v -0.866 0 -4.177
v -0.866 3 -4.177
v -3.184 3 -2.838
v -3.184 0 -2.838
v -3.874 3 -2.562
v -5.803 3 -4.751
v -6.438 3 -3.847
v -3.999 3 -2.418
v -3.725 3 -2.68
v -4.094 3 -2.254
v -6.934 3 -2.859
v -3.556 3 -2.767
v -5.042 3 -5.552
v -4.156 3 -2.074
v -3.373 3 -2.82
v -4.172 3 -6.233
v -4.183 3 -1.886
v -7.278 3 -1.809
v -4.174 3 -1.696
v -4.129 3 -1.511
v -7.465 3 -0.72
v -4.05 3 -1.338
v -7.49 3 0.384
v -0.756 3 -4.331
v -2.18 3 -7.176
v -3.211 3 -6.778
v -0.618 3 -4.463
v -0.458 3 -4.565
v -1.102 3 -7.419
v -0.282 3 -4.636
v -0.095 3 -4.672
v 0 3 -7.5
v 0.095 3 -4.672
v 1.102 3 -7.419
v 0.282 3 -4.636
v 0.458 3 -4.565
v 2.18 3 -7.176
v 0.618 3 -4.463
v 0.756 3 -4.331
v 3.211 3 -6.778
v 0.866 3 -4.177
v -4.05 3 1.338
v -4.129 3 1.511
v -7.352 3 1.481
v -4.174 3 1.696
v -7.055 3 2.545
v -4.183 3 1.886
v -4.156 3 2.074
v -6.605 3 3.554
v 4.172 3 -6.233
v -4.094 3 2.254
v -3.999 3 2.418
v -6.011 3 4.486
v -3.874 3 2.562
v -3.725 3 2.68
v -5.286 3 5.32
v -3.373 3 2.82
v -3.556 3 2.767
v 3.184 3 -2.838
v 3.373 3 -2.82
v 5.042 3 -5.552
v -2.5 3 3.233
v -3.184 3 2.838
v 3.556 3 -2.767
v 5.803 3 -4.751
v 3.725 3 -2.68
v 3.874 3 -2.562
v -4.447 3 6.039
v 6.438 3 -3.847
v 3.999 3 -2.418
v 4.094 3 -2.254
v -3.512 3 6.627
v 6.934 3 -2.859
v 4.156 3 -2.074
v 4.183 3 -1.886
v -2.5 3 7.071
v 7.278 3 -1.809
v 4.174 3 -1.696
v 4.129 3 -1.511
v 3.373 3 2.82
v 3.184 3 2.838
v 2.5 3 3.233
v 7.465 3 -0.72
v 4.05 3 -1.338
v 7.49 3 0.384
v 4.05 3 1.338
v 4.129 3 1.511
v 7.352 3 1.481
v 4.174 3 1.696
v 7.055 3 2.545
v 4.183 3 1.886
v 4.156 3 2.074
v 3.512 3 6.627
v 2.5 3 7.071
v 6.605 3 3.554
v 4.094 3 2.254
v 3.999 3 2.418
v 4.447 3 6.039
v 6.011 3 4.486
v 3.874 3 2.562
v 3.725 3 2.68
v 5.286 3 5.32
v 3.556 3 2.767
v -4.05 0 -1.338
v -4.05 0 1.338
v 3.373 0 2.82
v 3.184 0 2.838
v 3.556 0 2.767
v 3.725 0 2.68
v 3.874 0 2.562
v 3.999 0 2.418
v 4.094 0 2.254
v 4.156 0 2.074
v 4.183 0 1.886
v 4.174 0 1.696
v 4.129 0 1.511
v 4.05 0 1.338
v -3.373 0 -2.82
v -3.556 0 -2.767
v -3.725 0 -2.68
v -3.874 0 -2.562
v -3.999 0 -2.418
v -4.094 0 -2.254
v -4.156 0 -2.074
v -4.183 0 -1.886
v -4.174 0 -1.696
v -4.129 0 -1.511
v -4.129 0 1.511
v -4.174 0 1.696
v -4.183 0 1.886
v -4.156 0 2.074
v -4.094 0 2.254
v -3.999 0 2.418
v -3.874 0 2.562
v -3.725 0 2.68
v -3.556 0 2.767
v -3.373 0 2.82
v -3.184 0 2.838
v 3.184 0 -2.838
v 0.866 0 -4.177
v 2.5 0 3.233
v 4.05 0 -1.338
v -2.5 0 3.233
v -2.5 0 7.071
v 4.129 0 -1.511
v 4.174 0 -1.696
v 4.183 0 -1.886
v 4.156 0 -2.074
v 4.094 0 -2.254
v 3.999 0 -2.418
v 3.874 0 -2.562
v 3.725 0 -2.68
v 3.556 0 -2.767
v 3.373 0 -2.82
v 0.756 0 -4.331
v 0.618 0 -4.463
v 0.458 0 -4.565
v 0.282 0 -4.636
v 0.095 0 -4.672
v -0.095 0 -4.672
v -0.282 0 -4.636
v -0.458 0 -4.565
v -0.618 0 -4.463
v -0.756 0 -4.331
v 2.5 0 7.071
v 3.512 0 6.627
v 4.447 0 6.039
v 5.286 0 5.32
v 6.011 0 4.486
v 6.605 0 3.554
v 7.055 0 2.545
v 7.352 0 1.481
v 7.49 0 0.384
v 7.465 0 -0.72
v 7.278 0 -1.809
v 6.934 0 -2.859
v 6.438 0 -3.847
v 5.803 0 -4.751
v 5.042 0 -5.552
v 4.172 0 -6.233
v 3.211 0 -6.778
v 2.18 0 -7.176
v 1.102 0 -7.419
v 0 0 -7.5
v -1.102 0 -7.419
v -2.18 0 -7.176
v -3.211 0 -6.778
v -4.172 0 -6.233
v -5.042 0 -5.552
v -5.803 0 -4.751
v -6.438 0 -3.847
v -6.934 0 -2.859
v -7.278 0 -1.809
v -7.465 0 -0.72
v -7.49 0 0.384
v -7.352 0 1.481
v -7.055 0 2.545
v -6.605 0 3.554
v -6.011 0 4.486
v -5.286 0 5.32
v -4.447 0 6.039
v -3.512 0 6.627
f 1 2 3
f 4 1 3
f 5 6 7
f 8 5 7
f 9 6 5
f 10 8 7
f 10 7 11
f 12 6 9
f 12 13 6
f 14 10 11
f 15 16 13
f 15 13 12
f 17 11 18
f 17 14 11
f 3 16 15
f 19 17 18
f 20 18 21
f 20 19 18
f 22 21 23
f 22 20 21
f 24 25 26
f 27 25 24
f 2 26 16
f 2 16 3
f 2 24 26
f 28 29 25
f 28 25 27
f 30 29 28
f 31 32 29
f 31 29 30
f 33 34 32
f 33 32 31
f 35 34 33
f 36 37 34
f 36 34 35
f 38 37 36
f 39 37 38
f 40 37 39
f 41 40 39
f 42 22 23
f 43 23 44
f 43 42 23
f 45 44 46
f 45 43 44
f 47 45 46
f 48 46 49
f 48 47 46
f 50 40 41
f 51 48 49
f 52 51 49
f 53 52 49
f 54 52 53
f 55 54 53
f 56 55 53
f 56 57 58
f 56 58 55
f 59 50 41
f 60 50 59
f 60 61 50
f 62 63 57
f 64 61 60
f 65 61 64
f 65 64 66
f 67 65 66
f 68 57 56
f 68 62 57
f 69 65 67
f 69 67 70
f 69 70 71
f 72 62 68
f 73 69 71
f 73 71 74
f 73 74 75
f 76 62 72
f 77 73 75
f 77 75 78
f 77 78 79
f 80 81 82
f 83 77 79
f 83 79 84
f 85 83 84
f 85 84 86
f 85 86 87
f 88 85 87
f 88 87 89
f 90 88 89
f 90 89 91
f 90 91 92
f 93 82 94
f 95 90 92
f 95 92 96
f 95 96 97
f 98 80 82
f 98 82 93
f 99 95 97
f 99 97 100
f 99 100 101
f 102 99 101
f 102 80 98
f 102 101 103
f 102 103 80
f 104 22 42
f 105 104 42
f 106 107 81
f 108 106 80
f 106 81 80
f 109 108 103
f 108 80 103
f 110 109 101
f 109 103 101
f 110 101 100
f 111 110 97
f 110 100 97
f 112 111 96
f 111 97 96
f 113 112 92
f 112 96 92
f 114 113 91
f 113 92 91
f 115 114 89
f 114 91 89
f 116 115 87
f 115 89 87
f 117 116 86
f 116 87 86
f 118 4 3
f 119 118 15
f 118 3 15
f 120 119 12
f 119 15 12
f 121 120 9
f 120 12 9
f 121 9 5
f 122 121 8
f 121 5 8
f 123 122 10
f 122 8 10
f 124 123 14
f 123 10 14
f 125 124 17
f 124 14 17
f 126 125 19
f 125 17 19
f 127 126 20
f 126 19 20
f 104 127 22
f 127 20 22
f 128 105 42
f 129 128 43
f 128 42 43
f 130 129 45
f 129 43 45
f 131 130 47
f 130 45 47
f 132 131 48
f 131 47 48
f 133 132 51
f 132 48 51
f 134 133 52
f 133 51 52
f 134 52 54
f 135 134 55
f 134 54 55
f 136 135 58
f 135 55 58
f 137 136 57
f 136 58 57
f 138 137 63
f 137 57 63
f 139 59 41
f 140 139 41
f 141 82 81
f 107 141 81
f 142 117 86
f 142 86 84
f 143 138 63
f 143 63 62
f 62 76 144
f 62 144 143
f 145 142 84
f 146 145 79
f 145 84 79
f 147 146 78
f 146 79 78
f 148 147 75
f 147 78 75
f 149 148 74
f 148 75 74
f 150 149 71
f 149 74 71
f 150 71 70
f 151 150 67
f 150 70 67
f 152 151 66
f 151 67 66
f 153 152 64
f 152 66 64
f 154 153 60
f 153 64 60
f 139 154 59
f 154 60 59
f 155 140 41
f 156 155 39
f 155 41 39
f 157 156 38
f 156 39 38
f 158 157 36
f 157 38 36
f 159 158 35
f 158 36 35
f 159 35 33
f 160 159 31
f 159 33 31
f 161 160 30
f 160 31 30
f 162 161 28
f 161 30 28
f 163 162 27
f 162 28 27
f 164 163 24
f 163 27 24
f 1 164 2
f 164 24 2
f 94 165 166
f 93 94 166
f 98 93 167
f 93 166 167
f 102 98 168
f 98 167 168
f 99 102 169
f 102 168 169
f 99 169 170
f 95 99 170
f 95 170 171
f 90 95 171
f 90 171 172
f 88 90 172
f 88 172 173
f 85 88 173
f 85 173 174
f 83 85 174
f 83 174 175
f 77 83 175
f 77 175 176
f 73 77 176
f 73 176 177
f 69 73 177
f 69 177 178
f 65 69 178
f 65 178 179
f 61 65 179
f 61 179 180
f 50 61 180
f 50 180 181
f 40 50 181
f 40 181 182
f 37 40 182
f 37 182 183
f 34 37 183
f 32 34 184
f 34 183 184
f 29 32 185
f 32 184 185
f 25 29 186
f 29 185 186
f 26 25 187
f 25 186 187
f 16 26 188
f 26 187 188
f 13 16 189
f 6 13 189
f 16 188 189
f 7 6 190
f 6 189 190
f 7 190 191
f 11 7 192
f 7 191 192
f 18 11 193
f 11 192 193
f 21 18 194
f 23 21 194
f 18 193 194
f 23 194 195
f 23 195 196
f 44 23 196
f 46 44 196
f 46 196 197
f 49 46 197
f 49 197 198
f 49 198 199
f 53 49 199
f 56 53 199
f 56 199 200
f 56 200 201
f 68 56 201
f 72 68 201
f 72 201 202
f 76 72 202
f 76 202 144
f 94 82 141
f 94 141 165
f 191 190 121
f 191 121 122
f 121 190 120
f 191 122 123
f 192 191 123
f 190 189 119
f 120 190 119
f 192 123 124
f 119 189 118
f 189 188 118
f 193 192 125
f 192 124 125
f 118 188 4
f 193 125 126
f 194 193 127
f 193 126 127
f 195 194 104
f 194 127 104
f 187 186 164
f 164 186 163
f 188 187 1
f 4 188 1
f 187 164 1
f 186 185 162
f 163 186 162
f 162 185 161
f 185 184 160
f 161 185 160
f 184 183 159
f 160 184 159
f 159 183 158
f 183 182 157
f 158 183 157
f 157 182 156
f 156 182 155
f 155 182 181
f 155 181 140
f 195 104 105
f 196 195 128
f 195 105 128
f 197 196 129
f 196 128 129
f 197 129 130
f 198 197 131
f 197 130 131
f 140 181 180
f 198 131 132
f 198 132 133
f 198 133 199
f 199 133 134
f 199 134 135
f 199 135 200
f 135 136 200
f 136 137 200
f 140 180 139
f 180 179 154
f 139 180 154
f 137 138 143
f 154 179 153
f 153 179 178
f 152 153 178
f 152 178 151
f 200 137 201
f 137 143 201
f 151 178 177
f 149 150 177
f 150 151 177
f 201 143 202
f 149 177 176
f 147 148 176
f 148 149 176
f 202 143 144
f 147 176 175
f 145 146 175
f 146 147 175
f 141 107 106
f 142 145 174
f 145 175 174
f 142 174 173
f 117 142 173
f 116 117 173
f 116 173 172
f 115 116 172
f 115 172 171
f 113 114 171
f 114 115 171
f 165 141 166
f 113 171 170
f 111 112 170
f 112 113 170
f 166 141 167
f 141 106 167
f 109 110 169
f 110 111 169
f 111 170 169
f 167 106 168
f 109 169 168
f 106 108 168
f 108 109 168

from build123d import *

# Parameters (mm, degrees)
SKETCH_3_R               = 7.5
EXTRUDE_2_DEPTH          = 3
CUT_EXTRUDE_1_DEPTH      = 5
SKETCH_5_R               = 1
CUT_EXTRUDE_2_DEPTH      = 5
PATTERN_CIRCULAR_1_COUNT = 6
CUT_EXTRUDE_3_DEPTH      = 10


with BuildPart() as part:
    # 스케치3 → 보스-돌출2 (new body)
    with BuildSketch(Plane(origin=(0, 0, 0), x_dir=(1, 0, 0), z_dir=(0, 1, 0))):
        with Locations(Location((0, 0, 0), (0, 0, 270))):
            Circle(SKETCH_3_R)
    extrude(amount=EXTRUDE_2_DEPTH)

    # 스케치4 → 컷-돌출1 (cut)
    with BuildSketch(Plane(origin=(0, 3, 0), x_dir=(1, 0, 0), z_dir=(0, 1, 0))):
        Polygon((4.05, 2.33826859), (0, 4.67653718), (-4.05, 2.33826859), (-4.05, -2.33826859), (0, -4.67653718), (4.05, -2.33826859), align=None)
    extrude(amount=-CUT_EXTRUDE_1_DEPTH, mode=Mode.SUBTRACT)

    # 스케치5 → 컷-돌출2 (cut)
    with BuildSketch(Plane(origin=(0, 3, 0), x_dir=(1, 0, 0), z_dir=(0, 1, 0))):
        with Locations((0, 3.67653718)):
            Circle(SKETCH_5_R)
    cut_extrude_2 = extrude(amount=-CUT_EXTRUDE_2_DEPTH, mode=Mode.SUBTRACT)

    # 원형 패턴1: 컷-돌출2 ×6 about axis
    pattern_circular_1_axis = Axis((0, 0, 0), (0, 1, 0))
    for i in range(1, PATTERN_CIRCULAR_1_COUNT):
        add(cut_extrude_2.rotate(pattern_circular_1_axis, i * 360 / PATTERN_CIRCULAR_1_COUNT), mode=Mode.SUBTRACT)

    # 스케치6 → 컷-돌출3 (cut)
    with BuildSketch(Plane(origin=(0, 3, 0), x_dir=(1, 0, 0), z_dir=(0, 1, 0))):
        with BuildLine():
            Line((-2.5, -8.065496872), (-2.5, -2.774670645))
            ThreePointArc((-2.5, -2.774670645), (0, -0.274670645), (2.5, -2.774670645))
            Line((2.5, -2.774670645), (2.5, -8.065496872))
            ThreePointArc((2.5, -8.065496872), (0, -10.565496872), (-2.5, -8.065496872))
        make_face()
    extrude(amount=-CUT_EXTRUDE_3_DEPTH, mode=Mode.SUBTRACT)


solid = part.part
